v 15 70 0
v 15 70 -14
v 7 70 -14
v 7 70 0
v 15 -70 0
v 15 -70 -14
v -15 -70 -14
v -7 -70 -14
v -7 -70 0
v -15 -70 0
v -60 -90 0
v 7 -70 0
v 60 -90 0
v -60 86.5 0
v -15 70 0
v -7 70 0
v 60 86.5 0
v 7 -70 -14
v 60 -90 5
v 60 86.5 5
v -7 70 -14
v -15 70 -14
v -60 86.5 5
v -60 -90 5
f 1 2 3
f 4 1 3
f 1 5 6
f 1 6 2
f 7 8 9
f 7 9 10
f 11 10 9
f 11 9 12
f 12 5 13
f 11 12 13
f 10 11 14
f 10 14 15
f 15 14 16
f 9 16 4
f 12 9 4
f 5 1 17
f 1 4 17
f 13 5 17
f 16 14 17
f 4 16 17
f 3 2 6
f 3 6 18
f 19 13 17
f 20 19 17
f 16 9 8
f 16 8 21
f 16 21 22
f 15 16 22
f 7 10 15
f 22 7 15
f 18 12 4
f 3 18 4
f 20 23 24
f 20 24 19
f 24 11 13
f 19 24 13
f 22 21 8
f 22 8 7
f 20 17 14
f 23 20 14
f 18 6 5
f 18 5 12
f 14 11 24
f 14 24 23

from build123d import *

# Parameters (mm, degrees)
SKETCH1_W           = 120
SKETCH1_H           = 180
BOSS_EXTRUDE1_DEPTH = 5
SKETCH2_W           = 8
SKETCH2_H           = 140
BOSS_EXTRUDE2_DEPTH = 14
SKETCH3_W           = 120
SKETCH3_H           = 3.5
CUT_EXTRUDE1_DEPTH  = 10


with BuildPart() as part:
    # Sketch1 → Boss-Extrude1 (new body)
    with BuildSketch(Plane.XY):
        Rectangle(SKETCH1_W, SKETCH1_H)
    extrude(amount=BOSS_EXTRUDE1_DEPTH)

    # Sketch2 → Boss-Extrude2 (add)
    with BuildSketch(Plane(origin=(0, 0, 0), x_dir=(-1, 0, 0), z_dir=(0, 0, -1))):
        with Locations((-11, 0)):
            Rectangle(SKETCH2_W, SKETCH2_H)
        with Locations((11, 0)):
            Rectangle(SKETCH2_W, SKETCH2_H)
    extrude(amount=BOSS_EXTRUDE2_DEPTH)

    # Sketch3 → Cut-Extrude1 (cut)
    with BuildSketch(Plane(origin=(0, 0, 0), x_dir=(-1, 0, 0), z_dir=(0, 0, -1))):
        with Locations((0, 88.25)):
            Rectangle(SKETCH3_W, SKETCH3_H)
    extrude(amount=-CUT_EXTRUDE1_DEPTH, mode=Mode.SUBTRACT)


solid = part.part
